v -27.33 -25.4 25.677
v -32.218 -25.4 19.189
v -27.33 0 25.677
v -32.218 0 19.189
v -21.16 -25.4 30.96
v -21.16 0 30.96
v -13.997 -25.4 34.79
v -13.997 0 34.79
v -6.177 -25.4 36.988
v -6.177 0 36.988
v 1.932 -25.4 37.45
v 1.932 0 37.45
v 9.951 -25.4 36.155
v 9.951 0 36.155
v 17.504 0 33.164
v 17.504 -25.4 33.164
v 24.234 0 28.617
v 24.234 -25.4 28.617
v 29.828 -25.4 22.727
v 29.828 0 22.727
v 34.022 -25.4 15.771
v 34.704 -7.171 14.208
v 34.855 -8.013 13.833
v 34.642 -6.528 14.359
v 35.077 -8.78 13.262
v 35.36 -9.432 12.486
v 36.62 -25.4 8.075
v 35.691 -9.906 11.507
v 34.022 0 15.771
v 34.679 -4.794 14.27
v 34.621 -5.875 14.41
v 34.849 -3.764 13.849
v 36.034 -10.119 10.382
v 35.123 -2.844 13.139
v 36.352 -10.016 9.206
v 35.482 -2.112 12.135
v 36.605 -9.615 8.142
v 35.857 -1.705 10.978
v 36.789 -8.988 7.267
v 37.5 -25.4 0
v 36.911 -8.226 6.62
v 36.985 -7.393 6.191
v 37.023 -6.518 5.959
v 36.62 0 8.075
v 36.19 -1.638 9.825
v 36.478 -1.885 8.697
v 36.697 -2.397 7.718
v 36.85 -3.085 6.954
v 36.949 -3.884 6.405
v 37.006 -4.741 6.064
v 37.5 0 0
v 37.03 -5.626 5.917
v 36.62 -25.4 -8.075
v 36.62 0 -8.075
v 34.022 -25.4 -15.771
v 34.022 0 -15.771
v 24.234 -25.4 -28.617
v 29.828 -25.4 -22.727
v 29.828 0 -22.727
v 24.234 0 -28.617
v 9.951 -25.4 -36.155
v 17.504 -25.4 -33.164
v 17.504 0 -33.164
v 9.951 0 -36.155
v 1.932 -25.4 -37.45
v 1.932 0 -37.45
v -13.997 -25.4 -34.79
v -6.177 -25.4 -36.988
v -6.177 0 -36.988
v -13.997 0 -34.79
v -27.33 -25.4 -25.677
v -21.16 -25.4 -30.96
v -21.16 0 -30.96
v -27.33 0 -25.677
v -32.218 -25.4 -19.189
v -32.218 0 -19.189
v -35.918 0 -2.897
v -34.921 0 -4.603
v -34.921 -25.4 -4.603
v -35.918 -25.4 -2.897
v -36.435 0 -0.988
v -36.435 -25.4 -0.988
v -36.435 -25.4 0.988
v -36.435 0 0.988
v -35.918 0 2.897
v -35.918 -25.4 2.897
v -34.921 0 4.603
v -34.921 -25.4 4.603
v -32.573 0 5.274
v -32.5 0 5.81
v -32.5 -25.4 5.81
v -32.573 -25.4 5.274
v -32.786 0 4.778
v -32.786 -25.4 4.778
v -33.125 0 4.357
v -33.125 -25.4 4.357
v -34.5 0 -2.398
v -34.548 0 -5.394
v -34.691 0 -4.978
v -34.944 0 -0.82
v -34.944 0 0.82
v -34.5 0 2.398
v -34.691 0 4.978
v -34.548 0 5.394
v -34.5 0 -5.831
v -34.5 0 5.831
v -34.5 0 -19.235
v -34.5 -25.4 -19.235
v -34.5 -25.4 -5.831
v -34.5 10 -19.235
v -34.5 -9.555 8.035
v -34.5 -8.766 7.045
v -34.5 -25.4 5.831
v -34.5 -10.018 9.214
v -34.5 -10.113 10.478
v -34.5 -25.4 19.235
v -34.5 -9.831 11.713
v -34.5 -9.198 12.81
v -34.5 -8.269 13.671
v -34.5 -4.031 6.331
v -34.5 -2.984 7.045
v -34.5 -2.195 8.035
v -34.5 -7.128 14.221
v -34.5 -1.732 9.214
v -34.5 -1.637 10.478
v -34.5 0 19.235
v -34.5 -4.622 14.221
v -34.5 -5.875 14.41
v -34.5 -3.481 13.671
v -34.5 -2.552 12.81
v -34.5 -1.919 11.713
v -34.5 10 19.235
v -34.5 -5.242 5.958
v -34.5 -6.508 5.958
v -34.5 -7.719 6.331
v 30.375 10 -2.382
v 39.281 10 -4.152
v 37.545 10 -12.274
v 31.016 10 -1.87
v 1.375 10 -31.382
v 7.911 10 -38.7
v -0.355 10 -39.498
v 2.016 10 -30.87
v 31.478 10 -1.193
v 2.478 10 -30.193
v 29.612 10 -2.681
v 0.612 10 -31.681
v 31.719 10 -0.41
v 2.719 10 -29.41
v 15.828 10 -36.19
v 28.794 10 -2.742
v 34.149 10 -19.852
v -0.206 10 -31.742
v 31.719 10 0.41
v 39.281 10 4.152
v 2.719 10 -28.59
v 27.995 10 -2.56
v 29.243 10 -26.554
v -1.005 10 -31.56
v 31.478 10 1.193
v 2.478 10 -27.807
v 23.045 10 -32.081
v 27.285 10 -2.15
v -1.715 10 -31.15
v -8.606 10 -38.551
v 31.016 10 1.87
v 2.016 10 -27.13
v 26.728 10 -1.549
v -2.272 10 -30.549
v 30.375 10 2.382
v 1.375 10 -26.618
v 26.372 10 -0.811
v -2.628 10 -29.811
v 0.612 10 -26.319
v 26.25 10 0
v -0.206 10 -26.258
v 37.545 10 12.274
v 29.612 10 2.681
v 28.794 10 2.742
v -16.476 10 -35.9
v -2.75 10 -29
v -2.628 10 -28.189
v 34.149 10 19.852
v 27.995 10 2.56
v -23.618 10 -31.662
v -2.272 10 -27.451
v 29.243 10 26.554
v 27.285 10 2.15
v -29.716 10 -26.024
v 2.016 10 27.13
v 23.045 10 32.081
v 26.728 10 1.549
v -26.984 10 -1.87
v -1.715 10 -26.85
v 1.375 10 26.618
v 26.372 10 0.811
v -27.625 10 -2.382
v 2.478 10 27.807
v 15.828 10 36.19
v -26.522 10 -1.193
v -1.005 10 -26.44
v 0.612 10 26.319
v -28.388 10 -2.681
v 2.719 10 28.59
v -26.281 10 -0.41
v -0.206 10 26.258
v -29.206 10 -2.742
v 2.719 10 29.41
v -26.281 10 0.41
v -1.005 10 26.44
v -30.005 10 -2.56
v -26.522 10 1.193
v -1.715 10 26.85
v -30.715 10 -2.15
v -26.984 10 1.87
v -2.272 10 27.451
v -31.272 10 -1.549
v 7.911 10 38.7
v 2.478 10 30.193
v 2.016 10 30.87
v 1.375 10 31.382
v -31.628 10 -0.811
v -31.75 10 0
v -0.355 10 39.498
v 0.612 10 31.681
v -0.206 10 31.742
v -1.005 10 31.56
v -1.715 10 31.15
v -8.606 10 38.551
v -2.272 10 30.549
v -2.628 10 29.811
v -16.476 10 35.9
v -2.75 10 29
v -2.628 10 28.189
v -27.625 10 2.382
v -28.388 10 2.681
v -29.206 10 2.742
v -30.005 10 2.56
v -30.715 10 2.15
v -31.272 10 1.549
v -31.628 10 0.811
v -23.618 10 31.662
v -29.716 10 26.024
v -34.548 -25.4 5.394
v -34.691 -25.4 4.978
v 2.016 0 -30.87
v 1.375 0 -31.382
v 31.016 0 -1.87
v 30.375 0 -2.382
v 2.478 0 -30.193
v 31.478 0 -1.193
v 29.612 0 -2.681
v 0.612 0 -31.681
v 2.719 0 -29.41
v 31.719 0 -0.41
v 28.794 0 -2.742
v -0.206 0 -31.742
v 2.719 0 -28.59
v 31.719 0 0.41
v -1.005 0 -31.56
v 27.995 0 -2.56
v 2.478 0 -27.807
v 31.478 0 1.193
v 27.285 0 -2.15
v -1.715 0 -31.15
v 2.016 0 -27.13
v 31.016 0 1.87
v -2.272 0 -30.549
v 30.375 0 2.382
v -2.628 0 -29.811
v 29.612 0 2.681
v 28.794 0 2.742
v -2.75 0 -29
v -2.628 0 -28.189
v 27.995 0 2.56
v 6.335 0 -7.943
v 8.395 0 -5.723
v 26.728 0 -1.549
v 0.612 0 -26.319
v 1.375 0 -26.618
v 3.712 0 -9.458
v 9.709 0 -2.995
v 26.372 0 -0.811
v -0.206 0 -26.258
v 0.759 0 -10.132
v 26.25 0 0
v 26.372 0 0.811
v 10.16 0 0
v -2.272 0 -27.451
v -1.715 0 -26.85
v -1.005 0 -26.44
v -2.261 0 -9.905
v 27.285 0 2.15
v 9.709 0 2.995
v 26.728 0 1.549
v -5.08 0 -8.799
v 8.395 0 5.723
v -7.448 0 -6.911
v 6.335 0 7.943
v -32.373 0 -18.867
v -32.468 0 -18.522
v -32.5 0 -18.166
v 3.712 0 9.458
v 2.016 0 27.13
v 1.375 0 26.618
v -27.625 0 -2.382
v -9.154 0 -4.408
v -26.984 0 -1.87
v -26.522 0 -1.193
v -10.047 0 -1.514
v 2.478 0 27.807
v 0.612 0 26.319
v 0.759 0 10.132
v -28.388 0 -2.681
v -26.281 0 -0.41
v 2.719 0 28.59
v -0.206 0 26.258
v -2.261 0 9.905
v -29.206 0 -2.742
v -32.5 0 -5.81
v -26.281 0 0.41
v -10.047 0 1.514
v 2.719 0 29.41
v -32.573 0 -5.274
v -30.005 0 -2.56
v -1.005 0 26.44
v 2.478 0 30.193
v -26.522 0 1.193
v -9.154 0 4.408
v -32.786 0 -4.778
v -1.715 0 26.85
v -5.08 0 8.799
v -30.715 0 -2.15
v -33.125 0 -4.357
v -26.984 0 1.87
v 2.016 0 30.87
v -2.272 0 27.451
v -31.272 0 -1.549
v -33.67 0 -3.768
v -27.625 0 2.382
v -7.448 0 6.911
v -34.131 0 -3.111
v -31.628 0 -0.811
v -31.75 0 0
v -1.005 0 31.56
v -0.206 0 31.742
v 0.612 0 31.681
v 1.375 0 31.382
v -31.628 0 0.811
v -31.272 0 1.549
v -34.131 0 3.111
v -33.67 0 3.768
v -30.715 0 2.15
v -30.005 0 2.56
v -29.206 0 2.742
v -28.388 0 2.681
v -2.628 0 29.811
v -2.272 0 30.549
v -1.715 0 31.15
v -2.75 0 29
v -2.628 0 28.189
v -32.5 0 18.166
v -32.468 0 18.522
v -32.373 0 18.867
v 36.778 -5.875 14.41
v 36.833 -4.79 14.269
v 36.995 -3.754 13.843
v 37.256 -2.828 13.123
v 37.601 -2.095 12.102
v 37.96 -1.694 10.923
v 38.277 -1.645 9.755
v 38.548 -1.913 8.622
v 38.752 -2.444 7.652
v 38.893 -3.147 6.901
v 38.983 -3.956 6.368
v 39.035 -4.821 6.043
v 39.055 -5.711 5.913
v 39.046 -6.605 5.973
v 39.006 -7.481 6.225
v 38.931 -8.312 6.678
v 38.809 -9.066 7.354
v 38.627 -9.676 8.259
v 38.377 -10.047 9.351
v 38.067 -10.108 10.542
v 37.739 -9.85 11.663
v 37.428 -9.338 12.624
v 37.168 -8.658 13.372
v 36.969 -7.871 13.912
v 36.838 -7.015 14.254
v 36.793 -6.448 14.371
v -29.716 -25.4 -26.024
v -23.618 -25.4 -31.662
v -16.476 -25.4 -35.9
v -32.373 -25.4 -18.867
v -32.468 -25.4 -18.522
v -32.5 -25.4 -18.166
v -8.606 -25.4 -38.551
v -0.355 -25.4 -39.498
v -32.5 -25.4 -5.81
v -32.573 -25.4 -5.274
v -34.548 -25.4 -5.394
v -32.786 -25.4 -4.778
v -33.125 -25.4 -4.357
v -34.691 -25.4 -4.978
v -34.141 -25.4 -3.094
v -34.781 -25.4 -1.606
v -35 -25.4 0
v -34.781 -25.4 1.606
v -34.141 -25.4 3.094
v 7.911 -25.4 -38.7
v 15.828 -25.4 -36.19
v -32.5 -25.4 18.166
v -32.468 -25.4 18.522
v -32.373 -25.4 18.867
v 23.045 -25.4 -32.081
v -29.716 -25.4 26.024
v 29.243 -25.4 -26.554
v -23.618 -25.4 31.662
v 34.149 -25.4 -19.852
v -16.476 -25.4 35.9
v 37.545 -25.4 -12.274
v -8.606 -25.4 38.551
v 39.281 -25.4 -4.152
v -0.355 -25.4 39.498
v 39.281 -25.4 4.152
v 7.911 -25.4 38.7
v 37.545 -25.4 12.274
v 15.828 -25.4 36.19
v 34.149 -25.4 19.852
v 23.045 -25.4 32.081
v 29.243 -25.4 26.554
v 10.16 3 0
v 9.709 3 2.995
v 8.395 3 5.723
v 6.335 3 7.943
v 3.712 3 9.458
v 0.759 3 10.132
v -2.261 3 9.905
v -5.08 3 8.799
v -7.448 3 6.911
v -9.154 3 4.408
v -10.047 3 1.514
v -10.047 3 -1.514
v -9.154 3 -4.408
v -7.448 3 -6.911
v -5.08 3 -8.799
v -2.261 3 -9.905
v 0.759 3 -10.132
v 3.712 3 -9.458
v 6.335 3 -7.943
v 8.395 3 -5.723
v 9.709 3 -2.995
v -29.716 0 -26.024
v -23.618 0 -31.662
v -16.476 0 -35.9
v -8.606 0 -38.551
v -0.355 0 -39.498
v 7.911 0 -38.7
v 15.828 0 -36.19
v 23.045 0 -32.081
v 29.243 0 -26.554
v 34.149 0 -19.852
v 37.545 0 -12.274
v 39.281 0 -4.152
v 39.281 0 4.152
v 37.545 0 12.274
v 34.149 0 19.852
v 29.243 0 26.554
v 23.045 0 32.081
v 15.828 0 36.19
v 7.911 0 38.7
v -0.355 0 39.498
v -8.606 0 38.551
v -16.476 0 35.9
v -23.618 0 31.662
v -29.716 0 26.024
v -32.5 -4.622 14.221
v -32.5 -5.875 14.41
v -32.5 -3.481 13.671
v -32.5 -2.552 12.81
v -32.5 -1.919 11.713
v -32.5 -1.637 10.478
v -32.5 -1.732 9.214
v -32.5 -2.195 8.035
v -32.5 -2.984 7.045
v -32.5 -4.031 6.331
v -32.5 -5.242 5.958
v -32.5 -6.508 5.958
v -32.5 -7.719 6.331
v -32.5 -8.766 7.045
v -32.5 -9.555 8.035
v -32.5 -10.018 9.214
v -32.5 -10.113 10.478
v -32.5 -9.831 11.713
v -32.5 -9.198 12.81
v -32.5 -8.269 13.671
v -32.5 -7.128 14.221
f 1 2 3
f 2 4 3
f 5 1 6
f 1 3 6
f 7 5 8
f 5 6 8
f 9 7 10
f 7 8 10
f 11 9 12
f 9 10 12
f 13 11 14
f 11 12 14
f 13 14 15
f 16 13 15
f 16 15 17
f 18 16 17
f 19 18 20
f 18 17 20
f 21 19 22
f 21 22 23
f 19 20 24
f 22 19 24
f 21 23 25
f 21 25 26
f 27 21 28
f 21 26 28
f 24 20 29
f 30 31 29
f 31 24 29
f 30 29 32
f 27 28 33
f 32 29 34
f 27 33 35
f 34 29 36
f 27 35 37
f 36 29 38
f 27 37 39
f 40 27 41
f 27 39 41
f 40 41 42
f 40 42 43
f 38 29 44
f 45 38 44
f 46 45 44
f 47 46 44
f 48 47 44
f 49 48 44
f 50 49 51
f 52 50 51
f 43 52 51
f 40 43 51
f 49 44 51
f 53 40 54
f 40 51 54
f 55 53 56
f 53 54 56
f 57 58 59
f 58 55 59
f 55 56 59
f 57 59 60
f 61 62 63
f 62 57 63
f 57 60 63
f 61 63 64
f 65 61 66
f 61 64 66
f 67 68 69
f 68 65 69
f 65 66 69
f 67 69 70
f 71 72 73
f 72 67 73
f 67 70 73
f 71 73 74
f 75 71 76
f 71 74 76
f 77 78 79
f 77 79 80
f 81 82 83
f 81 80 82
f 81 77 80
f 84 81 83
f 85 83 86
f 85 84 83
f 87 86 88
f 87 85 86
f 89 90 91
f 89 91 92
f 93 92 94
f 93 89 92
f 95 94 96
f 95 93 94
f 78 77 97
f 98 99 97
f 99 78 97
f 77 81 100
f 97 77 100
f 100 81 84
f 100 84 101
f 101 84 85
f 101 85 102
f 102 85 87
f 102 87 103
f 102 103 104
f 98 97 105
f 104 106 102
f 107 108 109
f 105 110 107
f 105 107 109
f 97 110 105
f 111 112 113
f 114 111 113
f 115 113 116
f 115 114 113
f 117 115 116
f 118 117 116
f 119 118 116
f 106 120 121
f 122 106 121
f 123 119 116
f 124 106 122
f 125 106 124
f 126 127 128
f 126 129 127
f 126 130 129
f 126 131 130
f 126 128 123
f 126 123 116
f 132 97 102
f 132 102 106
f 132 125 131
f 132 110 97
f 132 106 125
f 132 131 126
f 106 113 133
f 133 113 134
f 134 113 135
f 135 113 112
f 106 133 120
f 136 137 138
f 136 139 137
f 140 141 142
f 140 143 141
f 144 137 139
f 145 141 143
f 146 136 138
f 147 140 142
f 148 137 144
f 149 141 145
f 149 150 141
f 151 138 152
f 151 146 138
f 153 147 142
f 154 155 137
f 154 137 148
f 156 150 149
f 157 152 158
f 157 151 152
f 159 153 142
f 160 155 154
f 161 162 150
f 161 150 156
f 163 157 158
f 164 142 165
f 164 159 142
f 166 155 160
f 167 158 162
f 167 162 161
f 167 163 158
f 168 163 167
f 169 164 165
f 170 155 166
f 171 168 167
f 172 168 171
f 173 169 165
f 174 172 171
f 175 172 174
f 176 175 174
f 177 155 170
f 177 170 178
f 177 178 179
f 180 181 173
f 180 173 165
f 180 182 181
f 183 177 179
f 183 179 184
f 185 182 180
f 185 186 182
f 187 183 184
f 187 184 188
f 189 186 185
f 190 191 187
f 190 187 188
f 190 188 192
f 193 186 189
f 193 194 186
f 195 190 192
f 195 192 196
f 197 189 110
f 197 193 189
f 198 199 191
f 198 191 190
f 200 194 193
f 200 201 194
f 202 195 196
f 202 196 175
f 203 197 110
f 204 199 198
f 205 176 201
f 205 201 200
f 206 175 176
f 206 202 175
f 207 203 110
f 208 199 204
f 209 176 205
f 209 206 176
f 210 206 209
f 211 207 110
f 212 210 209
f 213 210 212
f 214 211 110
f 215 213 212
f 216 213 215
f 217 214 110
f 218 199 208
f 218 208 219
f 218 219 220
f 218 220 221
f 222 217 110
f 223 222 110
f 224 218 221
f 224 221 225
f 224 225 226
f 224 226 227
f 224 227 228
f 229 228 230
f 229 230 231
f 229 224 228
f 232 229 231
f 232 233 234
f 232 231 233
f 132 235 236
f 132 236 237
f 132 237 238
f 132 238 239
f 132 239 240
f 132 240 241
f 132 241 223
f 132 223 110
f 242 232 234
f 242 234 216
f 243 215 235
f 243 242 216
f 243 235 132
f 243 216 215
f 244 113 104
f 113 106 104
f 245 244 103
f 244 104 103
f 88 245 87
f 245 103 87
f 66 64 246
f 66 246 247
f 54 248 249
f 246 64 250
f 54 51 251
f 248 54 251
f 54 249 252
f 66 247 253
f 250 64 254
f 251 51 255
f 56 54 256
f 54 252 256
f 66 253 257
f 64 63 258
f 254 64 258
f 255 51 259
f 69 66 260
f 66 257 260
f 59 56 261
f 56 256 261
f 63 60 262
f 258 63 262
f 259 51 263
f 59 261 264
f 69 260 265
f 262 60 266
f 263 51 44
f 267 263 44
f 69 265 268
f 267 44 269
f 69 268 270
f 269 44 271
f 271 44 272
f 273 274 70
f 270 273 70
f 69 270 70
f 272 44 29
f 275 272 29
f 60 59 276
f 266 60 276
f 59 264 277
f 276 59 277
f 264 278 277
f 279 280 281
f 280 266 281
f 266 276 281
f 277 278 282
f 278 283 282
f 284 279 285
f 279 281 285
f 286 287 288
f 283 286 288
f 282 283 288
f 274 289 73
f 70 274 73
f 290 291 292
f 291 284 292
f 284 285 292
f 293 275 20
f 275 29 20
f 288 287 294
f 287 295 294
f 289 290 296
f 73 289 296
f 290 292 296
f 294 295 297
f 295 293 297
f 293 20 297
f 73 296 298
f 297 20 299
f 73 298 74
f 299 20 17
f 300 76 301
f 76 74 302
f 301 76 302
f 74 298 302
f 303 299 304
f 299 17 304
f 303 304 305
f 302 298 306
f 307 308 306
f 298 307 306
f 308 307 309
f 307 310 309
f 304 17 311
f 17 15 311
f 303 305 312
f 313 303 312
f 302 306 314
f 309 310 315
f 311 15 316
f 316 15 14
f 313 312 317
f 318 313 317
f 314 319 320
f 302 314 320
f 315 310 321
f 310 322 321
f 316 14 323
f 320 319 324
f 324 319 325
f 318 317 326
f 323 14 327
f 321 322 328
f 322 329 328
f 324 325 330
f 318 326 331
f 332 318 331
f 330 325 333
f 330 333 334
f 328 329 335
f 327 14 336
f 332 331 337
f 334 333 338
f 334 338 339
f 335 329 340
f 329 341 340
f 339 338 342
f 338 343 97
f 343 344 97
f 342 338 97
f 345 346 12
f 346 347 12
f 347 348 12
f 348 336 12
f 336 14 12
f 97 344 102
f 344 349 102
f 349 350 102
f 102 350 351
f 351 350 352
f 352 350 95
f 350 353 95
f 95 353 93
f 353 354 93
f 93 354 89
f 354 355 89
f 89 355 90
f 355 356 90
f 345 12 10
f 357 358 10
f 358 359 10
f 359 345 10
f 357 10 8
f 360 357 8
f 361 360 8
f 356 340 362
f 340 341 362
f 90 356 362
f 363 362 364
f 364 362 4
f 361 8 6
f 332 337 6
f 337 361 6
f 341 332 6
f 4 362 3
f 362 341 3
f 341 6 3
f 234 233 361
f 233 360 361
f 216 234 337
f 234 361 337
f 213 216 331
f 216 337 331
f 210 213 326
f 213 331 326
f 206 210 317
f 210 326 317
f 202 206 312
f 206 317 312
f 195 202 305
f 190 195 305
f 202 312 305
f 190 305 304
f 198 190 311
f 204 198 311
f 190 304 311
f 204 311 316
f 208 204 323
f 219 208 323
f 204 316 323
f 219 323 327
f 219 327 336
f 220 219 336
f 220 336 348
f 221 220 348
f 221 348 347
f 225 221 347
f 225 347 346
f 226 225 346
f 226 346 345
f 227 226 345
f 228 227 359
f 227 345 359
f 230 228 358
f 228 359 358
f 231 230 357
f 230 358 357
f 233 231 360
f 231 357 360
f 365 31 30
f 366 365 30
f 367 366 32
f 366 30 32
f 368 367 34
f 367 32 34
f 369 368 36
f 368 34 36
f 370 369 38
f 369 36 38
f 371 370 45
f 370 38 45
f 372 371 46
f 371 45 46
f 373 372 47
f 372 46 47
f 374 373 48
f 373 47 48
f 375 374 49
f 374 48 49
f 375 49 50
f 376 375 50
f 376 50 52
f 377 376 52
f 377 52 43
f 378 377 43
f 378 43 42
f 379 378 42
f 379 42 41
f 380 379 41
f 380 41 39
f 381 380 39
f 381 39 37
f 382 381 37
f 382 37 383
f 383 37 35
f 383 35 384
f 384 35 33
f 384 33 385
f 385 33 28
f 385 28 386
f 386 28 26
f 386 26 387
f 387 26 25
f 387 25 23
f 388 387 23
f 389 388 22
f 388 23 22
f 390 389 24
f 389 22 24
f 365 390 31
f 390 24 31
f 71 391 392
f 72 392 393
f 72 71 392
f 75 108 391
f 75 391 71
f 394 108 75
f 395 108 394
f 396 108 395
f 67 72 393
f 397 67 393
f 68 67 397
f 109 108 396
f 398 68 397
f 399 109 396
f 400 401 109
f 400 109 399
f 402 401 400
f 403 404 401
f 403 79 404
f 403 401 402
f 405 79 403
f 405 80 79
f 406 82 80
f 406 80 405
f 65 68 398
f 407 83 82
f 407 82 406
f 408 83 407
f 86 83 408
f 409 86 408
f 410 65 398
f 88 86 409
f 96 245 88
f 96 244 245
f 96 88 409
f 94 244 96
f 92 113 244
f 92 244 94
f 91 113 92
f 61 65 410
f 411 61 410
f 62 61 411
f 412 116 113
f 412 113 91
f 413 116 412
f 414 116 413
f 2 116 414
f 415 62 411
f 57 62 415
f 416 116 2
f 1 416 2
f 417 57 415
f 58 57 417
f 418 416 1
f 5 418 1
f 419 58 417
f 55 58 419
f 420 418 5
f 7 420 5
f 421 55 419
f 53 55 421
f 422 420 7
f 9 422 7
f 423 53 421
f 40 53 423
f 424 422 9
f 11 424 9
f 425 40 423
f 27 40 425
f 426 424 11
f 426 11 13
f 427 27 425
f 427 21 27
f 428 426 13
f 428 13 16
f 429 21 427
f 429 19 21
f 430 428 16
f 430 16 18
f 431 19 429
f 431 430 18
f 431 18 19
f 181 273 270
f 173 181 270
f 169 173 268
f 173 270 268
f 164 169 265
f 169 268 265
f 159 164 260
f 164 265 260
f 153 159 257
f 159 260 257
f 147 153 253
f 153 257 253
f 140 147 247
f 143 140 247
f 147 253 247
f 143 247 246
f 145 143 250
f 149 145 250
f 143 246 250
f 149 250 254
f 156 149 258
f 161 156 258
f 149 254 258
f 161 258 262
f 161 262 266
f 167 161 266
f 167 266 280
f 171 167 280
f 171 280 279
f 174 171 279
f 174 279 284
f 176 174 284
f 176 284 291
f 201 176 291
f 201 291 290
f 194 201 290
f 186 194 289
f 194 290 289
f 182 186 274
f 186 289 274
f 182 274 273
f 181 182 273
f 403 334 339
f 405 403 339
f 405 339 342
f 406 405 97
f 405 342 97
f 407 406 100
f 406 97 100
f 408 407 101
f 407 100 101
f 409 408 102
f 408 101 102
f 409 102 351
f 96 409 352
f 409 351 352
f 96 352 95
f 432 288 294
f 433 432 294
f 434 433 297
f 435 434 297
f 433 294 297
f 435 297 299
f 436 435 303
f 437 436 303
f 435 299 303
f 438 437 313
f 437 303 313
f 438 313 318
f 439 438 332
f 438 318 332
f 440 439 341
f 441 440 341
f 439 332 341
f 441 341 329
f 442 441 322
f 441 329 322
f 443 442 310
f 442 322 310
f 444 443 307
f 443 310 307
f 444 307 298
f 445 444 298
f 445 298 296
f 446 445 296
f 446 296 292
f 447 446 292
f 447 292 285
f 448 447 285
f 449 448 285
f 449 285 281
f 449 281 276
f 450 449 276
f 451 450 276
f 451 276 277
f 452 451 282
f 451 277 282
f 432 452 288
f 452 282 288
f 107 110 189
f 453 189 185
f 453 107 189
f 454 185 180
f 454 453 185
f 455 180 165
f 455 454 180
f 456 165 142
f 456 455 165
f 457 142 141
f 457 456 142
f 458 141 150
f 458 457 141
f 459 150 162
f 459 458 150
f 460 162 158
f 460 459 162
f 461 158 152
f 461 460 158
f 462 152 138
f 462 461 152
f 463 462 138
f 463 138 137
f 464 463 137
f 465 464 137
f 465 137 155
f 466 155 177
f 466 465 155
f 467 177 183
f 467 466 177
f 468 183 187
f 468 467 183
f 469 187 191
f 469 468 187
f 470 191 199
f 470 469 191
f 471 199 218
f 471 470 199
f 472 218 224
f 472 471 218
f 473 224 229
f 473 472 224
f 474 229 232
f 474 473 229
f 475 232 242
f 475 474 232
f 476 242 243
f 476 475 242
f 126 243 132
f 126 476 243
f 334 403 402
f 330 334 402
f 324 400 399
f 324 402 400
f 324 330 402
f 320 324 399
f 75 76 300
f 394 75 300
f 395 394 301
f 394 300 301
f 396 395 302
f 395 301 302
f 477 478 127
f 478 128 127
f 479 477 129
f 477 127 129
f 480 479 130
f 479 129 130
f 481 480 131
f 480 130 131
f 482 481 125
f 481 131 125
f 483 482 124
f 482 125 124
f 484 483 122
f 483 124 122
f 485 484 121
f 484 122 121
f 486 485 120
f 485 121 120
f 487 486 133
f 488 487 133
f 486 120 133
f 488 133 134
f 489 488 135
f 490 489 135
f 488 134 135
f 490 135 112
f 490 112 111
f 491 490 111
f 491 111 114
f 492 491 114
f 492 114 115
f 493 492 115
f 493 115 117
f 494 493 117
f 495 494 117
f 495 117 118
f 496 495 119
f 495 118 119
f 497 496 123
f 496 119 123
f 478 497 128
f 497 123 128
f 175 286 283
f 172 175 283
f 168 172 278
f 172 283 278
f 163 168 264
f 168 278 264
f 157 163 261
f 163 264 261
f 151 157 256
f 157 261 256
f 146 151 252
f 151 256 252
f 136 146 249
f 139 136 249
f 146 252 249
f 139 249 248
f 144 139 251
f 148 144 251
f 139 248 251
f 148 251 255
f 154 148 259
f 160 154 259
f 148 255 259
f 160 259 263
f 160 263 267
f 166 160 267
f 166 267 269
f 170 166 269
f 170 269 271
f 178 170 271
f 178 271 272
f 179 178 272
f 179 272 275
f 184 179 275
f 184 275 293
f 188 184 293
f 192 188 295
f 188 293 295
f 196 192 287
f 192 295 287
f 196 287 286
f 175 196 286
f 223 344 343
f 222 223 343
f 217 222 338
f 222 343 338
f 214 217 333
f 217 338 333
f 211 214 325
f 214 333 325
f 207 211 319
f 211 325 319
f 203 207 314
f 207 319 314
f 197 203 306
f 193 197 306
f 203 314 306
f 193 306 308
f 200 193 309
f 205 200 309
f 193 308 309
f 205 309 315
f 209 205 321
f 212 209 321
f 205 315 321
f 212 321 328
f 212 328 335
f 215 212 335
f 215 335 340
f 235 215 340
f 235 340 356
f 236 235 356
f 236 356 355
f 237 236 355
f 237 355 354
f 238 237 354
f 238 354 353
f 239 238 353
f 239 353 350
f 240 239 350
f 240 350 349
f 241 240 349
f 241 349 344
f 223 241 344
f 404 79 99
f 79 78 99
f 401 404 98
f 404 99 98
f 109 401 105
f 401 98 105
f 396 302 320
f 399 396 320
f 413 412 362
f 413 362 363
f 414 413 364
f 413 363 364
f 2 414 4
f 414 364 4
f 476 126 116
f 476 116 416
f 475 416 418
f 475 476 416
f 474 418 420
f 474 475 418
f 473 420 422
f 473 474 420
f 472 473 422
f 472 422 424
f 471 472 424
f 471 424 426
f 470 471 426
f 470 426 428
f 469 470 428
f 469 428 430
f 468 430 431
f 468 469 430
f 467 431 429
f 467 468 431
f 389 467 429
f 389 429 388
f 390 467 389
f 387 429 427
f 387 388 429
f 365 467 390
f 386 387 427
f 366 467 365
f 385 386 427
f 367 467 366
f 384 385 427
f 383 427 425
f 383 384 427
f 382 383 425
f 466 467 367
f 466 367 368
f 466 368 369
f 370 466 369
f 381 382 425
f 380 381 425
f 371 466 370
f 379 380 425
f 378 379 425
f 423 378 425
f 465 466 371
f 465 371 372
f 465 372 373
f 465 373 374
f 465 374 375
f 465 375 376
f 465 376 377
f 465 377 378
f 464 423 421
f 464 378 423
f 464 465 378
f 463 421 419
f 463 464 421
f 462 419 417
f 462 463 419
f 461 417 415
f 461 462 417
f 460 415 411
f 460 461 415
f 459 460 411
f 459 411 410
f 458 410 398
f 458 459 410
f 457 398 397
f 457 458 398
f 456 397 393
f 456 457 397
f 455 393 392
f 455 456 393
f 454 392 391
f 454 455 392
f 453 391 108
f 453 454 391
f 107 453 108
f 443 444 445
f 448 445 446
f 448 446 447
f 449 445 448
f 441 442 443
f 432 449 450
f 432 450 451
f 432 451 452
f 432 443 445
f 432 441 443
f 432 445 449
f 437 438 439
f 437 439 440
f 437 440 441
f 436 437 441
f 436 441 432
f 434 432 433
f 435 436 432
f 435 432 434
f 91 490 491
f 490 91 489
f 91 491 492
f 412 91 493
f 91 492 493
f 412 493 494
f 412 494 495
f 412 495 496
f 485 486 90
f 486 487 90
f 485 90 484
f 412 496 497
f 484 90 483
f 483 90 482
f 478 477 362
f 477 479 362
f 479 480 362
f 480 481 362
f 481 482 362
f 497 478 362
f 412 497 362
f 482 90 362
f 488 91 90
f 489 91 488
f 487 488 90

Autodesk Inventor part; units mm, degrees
ref_plane "YZ Plane" through (0, 0, 0) normal (1, 0, 0) x (0, 1, 0)
ref_plane "XZ Plane" through (0, 0, 0) normal (0, 1, 0) x (-1, 0, 0)
ref_plane "XY Plane" through (0, 0, 0) normal (0, 0, 1) x (1, 0, 0)
sketch "Sketch1" plane through (0, 0, 0) normal (0, 1, 0) x (-1, 0, 0)
  circle A0 centre (0, 0) radius 39.5
  circle A1 centre (0, 0) radius 10
  circle A2 centre (0, 0) radius 29
  circle A3 centre (29, 0) radius 2.75
  circle A4 centre (0, 29) radius 2.75
  circle A5 centre (-29, 0) radius 2.75
  circle A6 centre (0, -29) radius 2.75
  dimension "d2" = 58
  dimension "d0" = 79
  dimension "d1" = 20
  dimension "d3" = 5.5
  dimension "d6" = 360
extrude "Extrusion1" add sketch "Sketch1" along normal blind 10 contours A0 | A1 | A3 A2 A6 A5 A4
sketch "Sketch3" plane through (0, 10, 0) normal (0, 1, 0) x (1, 0, 0)
  line L0 (-34.5, 50.157) -> (-34.5, -49.8555)
  circle A0 centre (0, 0) radius 39.5 projected
  point P0 (-34.5, -19.2354)
  point P1 (-34.5, 19.2354)
  dimension "d18" = 5
extrude "Extrusion3" cut sketch "Sketch3" along normal through all both and the other way through all contours L0 A0 picked at (-35.5583, 3.956)
sketch "Sketch4" plane through (0, 0, 0) normal (0, -1, 0) x (1, 0, 0)
  circle A0 centre (0, 0) radius 10.16
  dimension "d21" = 20.32
extrude "Extrusion4" cut sketch "Sketch4" against normal blind 3
sketch "Sketch5" plane through (0, 0, 0) normal (0, -1, 0) x (1, 0, 0)
  arc A0 (-34.5, -19.2354) -> (-34.5, 19.2354) centre (0, 0) ccw
  line L0 (-34.5, 19.2354) -> (-34.5, -19.2354) projected
  arc A1 (-32.2183, -19.1893) -> (-32.2183, 19.1893) centre (0, 0) ccw
  circle A2 centre (-29, 0) radius 2.75 projected
  arc A3 (-34.9211, 4.6034) -> (-34.9211, -4.6034) centre (-29, 0) ccw
  arc A4 (-33.125, 4.3571) -> (-33.125, -4.3571) centre (-29, 0) ccw
  line L1 (-32.5, -18.1659) -> (-32.5, -5.8095)
  line L2 (-32.5, 5.8095) -> (-32.5, 18.1659)
  line L3 (-34.5, 19.2354) -> (-34.5, 5.831)
  line L4 (-34.5, -5.831) -> (-34.5, -19.2354)
  arc A5 (-32.2183, 19.1893) -> (-32.5, 18.1659) centre (-30.5, 18.1659) ccw
  arc A6 (-32.5, -18.1659) -> (-32.2183, -19.1893) centre (-30.5, -18.1659) ccw
  arc A7 (-33.125, 4.3571) -> (-32.5, 5.8095) centre (-34.5, 5.8095) ccw
  arc A8 (-32.5, -5.8095) -> (-33.125, -4.3571) centre (-34.5, -5.8095) ccw
  arc A9 (-34.5, -5.831) -> (-34.9211, -4.6034) centre (-36.5, -5.831) ccw
  arc A10 (-34.9211, 4.6034) -> (-34.5, 5.831) centre (-36.5, 5.831) ccw
  point P0 (-32.5, 18.7083)
  point P1 (-32.5, -18.7083)
  point P2 (-32.5, -4.8734)
  point P3 (-32.5, 4.8734)
  point P4 (-34.5, -5.099)
  point P5 (-34.5, 5.099)
  point P6 (-34.5, 5.831)
  point P7 (-34.5, -5.831)
  dimension "d24" = 2
  dimension "d25" = 1.5
  dimension "d26" = 2
  dimension "d27" = 2
  dimension "d32" = 7.5
extrude "Extrusion5" add sketch "Sketch5" along normal blind 25.4 contours L0 A4 A8 L1 A6 A1 A5 L2 A7 A0 | A9 A3 A10 L0 A4
sketch "Sketch6" plane through (-34.5, 10, -19.2354) normal (-1, 0, 0) x (0, 0, 1)
  circle A0 centre (29.3954, -15.875) radius 4.2498
  point P0 (19.2354, -10)
extrude "Extrusion6" cut sketch "Sketch6" against normal through all
properties part number "PZT cell"
